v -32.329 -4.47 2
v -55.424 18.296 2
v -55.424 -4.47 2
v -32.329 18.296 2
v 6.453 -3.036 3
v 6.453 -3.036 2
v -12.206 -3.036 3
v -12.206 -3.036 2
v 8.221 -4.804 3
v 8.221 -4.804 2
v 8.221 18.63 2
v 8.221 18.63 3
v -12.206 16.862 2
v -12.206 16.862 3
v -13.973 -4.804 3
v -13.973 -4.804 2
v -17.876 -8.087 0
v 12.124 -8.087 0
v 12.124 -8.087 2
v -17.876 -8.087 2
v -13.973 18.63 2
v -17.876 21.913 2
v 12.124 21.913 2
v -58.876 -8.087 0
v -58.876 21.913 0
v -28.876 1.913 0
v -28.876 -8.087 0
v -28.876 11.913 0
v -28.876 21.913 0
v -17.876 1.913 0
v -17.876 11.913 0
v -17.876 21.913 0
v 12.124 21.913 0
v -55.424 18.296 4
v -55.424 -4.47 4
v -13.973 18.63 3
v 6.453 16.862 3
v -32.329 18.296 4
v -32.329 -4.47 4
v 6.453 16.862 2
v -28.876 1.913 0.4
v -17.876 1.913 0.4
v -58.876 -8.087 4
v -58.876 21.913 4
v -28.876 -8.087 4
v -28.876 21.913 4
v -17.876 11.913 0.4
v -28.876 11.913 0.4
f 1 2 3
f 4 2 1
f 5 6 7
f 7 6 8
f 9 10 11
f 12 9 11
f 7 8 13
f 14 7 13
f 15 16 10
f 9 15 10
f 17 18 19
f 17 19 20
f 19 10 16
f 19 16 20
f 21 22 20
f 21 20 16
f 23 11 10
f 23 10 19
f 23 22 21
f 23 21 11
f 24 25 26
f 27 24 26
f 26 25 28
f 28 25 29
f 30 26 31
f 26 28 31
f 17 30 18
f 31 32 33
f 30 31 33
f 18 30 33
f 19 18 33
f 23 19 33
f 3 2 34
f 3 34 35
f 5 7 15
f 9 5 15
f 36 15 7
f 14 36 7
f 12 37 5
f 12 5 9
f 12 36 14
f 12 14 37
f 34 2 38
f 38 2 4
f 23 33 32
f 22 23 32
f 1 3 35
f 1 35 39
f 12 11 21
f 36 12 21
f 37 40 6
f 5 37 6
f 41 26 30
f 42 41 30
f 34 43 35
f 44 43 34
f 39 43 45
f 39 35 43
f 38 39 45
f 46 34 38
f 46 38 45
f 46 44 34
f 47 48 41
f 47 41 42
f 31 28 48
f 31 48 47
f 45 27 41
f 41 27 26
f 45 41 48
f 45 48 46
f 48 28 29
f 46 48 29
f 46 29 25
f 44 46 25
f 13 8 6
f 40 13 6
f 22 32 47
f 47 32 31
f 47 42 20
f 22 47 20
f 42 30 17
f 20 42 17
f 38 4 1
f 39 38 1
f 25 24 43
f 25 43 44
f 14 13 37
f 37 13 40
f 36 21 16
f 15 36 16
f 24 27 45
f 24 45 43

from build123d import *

# Parameters (mm, degrees)
SKETCH1_W             = 30
SKETCH1_H             = 30
BOSS_EXTRUDE1_DEPTH   = 2
BOSS_EXTRUDE1_2_DEPTH = 2
SKETCH1_3_W           = 30
SKETCH1_3_H           = 30
SKETCH1_3_W_2         = 23.094824398
SKETCH1_3_H_2         = 22.76684371
BOSS_EXTRUDE2_DEPTH   = 4
SKETCH1_4_W           = 22.194379656
SKETCH1_4_H           = 23.434004946
SKETCH1_4_W_2         = 18.65884575
SKETCH1_4_H_2         = 19.89847104
BOSS_EXTRUDE3_DEPTH   = 3
SKETCH1_5_W           = 11
SKETCH1_5_H           = 10
BOSS_EXTRUDE4_DEPTH   = 0.4


with BuildPart() as part:
    # Sketch1 → Boss-Extrude1 (new body)
    with BuildSketch(Plane.XY):
        with Locations((-43.876243767, 6.913043478)):
            Rectangle(SKETCH1_W, SKETCH1_H)
    extrude(amount=BOSS_EXTRUDE1_DEPTH)

    # Sketch1<3> → Boss-Extrude2 (add)
    with BuildSketch(Plane.XY):
        with Locations((-43.876243767, 6.913043478)):
            Rectangle(SKETCH1_3_W, SKETCH1_3_H)
        with Locations((-43.876243767, 6.913043478)):
            Rectangle(SKETCH1_3_W_2, SKETCH1_3_H_2, mode=Mode.SUBTRACT)
    extrude(amount=BOSS_EXTRUDE2_DEPTH)



with BuildPart() as body_2:
    # Sketch1 → Boss-Extrude1 2 (new body)
    with BuildSketch(Plane.XY):
        with Locations((-2.876243767, 6.913043478)):
            Rectangle(SKETCH1_W, SKETCH1_H)
    extrude(amount=BOSS_EXTRUDE1_2_DEPTH)

    # Sketch1<4> → Boss-Extrude3 (add)
    with BuildSketch(Plane.XY):
        with Locations((-2.876243767, 6.913043478)):
            Rectangle(SKETCH1_4_W, SKETCH1_4_H)
        with Locations((-2.876243767, 6.913043478)):
            Rectangle(SKETCH1_4_W_2, SKETCH1_4_H_2, mode=Mode.SUBTRACT)
    extrude(amount=BOSS_EXTRUDE3_DEPTH)


with BuildPart() as part_1:
    add(part.part)

    add(body_2.part)  # Boss-Extrude4 merges body 2
    # Sketch1<5> → Boss-Extrude4 (add)
    with BuildSketch(Plane.XY):
        with Locations((-23.376243767, 6.913043478)):
            Rectangle(SKETCH1_5_W, SKETCH1_5_H)
    extrude(amount=BOSS_EXTRUDE4_DEPTH)


solid = part_1.part
